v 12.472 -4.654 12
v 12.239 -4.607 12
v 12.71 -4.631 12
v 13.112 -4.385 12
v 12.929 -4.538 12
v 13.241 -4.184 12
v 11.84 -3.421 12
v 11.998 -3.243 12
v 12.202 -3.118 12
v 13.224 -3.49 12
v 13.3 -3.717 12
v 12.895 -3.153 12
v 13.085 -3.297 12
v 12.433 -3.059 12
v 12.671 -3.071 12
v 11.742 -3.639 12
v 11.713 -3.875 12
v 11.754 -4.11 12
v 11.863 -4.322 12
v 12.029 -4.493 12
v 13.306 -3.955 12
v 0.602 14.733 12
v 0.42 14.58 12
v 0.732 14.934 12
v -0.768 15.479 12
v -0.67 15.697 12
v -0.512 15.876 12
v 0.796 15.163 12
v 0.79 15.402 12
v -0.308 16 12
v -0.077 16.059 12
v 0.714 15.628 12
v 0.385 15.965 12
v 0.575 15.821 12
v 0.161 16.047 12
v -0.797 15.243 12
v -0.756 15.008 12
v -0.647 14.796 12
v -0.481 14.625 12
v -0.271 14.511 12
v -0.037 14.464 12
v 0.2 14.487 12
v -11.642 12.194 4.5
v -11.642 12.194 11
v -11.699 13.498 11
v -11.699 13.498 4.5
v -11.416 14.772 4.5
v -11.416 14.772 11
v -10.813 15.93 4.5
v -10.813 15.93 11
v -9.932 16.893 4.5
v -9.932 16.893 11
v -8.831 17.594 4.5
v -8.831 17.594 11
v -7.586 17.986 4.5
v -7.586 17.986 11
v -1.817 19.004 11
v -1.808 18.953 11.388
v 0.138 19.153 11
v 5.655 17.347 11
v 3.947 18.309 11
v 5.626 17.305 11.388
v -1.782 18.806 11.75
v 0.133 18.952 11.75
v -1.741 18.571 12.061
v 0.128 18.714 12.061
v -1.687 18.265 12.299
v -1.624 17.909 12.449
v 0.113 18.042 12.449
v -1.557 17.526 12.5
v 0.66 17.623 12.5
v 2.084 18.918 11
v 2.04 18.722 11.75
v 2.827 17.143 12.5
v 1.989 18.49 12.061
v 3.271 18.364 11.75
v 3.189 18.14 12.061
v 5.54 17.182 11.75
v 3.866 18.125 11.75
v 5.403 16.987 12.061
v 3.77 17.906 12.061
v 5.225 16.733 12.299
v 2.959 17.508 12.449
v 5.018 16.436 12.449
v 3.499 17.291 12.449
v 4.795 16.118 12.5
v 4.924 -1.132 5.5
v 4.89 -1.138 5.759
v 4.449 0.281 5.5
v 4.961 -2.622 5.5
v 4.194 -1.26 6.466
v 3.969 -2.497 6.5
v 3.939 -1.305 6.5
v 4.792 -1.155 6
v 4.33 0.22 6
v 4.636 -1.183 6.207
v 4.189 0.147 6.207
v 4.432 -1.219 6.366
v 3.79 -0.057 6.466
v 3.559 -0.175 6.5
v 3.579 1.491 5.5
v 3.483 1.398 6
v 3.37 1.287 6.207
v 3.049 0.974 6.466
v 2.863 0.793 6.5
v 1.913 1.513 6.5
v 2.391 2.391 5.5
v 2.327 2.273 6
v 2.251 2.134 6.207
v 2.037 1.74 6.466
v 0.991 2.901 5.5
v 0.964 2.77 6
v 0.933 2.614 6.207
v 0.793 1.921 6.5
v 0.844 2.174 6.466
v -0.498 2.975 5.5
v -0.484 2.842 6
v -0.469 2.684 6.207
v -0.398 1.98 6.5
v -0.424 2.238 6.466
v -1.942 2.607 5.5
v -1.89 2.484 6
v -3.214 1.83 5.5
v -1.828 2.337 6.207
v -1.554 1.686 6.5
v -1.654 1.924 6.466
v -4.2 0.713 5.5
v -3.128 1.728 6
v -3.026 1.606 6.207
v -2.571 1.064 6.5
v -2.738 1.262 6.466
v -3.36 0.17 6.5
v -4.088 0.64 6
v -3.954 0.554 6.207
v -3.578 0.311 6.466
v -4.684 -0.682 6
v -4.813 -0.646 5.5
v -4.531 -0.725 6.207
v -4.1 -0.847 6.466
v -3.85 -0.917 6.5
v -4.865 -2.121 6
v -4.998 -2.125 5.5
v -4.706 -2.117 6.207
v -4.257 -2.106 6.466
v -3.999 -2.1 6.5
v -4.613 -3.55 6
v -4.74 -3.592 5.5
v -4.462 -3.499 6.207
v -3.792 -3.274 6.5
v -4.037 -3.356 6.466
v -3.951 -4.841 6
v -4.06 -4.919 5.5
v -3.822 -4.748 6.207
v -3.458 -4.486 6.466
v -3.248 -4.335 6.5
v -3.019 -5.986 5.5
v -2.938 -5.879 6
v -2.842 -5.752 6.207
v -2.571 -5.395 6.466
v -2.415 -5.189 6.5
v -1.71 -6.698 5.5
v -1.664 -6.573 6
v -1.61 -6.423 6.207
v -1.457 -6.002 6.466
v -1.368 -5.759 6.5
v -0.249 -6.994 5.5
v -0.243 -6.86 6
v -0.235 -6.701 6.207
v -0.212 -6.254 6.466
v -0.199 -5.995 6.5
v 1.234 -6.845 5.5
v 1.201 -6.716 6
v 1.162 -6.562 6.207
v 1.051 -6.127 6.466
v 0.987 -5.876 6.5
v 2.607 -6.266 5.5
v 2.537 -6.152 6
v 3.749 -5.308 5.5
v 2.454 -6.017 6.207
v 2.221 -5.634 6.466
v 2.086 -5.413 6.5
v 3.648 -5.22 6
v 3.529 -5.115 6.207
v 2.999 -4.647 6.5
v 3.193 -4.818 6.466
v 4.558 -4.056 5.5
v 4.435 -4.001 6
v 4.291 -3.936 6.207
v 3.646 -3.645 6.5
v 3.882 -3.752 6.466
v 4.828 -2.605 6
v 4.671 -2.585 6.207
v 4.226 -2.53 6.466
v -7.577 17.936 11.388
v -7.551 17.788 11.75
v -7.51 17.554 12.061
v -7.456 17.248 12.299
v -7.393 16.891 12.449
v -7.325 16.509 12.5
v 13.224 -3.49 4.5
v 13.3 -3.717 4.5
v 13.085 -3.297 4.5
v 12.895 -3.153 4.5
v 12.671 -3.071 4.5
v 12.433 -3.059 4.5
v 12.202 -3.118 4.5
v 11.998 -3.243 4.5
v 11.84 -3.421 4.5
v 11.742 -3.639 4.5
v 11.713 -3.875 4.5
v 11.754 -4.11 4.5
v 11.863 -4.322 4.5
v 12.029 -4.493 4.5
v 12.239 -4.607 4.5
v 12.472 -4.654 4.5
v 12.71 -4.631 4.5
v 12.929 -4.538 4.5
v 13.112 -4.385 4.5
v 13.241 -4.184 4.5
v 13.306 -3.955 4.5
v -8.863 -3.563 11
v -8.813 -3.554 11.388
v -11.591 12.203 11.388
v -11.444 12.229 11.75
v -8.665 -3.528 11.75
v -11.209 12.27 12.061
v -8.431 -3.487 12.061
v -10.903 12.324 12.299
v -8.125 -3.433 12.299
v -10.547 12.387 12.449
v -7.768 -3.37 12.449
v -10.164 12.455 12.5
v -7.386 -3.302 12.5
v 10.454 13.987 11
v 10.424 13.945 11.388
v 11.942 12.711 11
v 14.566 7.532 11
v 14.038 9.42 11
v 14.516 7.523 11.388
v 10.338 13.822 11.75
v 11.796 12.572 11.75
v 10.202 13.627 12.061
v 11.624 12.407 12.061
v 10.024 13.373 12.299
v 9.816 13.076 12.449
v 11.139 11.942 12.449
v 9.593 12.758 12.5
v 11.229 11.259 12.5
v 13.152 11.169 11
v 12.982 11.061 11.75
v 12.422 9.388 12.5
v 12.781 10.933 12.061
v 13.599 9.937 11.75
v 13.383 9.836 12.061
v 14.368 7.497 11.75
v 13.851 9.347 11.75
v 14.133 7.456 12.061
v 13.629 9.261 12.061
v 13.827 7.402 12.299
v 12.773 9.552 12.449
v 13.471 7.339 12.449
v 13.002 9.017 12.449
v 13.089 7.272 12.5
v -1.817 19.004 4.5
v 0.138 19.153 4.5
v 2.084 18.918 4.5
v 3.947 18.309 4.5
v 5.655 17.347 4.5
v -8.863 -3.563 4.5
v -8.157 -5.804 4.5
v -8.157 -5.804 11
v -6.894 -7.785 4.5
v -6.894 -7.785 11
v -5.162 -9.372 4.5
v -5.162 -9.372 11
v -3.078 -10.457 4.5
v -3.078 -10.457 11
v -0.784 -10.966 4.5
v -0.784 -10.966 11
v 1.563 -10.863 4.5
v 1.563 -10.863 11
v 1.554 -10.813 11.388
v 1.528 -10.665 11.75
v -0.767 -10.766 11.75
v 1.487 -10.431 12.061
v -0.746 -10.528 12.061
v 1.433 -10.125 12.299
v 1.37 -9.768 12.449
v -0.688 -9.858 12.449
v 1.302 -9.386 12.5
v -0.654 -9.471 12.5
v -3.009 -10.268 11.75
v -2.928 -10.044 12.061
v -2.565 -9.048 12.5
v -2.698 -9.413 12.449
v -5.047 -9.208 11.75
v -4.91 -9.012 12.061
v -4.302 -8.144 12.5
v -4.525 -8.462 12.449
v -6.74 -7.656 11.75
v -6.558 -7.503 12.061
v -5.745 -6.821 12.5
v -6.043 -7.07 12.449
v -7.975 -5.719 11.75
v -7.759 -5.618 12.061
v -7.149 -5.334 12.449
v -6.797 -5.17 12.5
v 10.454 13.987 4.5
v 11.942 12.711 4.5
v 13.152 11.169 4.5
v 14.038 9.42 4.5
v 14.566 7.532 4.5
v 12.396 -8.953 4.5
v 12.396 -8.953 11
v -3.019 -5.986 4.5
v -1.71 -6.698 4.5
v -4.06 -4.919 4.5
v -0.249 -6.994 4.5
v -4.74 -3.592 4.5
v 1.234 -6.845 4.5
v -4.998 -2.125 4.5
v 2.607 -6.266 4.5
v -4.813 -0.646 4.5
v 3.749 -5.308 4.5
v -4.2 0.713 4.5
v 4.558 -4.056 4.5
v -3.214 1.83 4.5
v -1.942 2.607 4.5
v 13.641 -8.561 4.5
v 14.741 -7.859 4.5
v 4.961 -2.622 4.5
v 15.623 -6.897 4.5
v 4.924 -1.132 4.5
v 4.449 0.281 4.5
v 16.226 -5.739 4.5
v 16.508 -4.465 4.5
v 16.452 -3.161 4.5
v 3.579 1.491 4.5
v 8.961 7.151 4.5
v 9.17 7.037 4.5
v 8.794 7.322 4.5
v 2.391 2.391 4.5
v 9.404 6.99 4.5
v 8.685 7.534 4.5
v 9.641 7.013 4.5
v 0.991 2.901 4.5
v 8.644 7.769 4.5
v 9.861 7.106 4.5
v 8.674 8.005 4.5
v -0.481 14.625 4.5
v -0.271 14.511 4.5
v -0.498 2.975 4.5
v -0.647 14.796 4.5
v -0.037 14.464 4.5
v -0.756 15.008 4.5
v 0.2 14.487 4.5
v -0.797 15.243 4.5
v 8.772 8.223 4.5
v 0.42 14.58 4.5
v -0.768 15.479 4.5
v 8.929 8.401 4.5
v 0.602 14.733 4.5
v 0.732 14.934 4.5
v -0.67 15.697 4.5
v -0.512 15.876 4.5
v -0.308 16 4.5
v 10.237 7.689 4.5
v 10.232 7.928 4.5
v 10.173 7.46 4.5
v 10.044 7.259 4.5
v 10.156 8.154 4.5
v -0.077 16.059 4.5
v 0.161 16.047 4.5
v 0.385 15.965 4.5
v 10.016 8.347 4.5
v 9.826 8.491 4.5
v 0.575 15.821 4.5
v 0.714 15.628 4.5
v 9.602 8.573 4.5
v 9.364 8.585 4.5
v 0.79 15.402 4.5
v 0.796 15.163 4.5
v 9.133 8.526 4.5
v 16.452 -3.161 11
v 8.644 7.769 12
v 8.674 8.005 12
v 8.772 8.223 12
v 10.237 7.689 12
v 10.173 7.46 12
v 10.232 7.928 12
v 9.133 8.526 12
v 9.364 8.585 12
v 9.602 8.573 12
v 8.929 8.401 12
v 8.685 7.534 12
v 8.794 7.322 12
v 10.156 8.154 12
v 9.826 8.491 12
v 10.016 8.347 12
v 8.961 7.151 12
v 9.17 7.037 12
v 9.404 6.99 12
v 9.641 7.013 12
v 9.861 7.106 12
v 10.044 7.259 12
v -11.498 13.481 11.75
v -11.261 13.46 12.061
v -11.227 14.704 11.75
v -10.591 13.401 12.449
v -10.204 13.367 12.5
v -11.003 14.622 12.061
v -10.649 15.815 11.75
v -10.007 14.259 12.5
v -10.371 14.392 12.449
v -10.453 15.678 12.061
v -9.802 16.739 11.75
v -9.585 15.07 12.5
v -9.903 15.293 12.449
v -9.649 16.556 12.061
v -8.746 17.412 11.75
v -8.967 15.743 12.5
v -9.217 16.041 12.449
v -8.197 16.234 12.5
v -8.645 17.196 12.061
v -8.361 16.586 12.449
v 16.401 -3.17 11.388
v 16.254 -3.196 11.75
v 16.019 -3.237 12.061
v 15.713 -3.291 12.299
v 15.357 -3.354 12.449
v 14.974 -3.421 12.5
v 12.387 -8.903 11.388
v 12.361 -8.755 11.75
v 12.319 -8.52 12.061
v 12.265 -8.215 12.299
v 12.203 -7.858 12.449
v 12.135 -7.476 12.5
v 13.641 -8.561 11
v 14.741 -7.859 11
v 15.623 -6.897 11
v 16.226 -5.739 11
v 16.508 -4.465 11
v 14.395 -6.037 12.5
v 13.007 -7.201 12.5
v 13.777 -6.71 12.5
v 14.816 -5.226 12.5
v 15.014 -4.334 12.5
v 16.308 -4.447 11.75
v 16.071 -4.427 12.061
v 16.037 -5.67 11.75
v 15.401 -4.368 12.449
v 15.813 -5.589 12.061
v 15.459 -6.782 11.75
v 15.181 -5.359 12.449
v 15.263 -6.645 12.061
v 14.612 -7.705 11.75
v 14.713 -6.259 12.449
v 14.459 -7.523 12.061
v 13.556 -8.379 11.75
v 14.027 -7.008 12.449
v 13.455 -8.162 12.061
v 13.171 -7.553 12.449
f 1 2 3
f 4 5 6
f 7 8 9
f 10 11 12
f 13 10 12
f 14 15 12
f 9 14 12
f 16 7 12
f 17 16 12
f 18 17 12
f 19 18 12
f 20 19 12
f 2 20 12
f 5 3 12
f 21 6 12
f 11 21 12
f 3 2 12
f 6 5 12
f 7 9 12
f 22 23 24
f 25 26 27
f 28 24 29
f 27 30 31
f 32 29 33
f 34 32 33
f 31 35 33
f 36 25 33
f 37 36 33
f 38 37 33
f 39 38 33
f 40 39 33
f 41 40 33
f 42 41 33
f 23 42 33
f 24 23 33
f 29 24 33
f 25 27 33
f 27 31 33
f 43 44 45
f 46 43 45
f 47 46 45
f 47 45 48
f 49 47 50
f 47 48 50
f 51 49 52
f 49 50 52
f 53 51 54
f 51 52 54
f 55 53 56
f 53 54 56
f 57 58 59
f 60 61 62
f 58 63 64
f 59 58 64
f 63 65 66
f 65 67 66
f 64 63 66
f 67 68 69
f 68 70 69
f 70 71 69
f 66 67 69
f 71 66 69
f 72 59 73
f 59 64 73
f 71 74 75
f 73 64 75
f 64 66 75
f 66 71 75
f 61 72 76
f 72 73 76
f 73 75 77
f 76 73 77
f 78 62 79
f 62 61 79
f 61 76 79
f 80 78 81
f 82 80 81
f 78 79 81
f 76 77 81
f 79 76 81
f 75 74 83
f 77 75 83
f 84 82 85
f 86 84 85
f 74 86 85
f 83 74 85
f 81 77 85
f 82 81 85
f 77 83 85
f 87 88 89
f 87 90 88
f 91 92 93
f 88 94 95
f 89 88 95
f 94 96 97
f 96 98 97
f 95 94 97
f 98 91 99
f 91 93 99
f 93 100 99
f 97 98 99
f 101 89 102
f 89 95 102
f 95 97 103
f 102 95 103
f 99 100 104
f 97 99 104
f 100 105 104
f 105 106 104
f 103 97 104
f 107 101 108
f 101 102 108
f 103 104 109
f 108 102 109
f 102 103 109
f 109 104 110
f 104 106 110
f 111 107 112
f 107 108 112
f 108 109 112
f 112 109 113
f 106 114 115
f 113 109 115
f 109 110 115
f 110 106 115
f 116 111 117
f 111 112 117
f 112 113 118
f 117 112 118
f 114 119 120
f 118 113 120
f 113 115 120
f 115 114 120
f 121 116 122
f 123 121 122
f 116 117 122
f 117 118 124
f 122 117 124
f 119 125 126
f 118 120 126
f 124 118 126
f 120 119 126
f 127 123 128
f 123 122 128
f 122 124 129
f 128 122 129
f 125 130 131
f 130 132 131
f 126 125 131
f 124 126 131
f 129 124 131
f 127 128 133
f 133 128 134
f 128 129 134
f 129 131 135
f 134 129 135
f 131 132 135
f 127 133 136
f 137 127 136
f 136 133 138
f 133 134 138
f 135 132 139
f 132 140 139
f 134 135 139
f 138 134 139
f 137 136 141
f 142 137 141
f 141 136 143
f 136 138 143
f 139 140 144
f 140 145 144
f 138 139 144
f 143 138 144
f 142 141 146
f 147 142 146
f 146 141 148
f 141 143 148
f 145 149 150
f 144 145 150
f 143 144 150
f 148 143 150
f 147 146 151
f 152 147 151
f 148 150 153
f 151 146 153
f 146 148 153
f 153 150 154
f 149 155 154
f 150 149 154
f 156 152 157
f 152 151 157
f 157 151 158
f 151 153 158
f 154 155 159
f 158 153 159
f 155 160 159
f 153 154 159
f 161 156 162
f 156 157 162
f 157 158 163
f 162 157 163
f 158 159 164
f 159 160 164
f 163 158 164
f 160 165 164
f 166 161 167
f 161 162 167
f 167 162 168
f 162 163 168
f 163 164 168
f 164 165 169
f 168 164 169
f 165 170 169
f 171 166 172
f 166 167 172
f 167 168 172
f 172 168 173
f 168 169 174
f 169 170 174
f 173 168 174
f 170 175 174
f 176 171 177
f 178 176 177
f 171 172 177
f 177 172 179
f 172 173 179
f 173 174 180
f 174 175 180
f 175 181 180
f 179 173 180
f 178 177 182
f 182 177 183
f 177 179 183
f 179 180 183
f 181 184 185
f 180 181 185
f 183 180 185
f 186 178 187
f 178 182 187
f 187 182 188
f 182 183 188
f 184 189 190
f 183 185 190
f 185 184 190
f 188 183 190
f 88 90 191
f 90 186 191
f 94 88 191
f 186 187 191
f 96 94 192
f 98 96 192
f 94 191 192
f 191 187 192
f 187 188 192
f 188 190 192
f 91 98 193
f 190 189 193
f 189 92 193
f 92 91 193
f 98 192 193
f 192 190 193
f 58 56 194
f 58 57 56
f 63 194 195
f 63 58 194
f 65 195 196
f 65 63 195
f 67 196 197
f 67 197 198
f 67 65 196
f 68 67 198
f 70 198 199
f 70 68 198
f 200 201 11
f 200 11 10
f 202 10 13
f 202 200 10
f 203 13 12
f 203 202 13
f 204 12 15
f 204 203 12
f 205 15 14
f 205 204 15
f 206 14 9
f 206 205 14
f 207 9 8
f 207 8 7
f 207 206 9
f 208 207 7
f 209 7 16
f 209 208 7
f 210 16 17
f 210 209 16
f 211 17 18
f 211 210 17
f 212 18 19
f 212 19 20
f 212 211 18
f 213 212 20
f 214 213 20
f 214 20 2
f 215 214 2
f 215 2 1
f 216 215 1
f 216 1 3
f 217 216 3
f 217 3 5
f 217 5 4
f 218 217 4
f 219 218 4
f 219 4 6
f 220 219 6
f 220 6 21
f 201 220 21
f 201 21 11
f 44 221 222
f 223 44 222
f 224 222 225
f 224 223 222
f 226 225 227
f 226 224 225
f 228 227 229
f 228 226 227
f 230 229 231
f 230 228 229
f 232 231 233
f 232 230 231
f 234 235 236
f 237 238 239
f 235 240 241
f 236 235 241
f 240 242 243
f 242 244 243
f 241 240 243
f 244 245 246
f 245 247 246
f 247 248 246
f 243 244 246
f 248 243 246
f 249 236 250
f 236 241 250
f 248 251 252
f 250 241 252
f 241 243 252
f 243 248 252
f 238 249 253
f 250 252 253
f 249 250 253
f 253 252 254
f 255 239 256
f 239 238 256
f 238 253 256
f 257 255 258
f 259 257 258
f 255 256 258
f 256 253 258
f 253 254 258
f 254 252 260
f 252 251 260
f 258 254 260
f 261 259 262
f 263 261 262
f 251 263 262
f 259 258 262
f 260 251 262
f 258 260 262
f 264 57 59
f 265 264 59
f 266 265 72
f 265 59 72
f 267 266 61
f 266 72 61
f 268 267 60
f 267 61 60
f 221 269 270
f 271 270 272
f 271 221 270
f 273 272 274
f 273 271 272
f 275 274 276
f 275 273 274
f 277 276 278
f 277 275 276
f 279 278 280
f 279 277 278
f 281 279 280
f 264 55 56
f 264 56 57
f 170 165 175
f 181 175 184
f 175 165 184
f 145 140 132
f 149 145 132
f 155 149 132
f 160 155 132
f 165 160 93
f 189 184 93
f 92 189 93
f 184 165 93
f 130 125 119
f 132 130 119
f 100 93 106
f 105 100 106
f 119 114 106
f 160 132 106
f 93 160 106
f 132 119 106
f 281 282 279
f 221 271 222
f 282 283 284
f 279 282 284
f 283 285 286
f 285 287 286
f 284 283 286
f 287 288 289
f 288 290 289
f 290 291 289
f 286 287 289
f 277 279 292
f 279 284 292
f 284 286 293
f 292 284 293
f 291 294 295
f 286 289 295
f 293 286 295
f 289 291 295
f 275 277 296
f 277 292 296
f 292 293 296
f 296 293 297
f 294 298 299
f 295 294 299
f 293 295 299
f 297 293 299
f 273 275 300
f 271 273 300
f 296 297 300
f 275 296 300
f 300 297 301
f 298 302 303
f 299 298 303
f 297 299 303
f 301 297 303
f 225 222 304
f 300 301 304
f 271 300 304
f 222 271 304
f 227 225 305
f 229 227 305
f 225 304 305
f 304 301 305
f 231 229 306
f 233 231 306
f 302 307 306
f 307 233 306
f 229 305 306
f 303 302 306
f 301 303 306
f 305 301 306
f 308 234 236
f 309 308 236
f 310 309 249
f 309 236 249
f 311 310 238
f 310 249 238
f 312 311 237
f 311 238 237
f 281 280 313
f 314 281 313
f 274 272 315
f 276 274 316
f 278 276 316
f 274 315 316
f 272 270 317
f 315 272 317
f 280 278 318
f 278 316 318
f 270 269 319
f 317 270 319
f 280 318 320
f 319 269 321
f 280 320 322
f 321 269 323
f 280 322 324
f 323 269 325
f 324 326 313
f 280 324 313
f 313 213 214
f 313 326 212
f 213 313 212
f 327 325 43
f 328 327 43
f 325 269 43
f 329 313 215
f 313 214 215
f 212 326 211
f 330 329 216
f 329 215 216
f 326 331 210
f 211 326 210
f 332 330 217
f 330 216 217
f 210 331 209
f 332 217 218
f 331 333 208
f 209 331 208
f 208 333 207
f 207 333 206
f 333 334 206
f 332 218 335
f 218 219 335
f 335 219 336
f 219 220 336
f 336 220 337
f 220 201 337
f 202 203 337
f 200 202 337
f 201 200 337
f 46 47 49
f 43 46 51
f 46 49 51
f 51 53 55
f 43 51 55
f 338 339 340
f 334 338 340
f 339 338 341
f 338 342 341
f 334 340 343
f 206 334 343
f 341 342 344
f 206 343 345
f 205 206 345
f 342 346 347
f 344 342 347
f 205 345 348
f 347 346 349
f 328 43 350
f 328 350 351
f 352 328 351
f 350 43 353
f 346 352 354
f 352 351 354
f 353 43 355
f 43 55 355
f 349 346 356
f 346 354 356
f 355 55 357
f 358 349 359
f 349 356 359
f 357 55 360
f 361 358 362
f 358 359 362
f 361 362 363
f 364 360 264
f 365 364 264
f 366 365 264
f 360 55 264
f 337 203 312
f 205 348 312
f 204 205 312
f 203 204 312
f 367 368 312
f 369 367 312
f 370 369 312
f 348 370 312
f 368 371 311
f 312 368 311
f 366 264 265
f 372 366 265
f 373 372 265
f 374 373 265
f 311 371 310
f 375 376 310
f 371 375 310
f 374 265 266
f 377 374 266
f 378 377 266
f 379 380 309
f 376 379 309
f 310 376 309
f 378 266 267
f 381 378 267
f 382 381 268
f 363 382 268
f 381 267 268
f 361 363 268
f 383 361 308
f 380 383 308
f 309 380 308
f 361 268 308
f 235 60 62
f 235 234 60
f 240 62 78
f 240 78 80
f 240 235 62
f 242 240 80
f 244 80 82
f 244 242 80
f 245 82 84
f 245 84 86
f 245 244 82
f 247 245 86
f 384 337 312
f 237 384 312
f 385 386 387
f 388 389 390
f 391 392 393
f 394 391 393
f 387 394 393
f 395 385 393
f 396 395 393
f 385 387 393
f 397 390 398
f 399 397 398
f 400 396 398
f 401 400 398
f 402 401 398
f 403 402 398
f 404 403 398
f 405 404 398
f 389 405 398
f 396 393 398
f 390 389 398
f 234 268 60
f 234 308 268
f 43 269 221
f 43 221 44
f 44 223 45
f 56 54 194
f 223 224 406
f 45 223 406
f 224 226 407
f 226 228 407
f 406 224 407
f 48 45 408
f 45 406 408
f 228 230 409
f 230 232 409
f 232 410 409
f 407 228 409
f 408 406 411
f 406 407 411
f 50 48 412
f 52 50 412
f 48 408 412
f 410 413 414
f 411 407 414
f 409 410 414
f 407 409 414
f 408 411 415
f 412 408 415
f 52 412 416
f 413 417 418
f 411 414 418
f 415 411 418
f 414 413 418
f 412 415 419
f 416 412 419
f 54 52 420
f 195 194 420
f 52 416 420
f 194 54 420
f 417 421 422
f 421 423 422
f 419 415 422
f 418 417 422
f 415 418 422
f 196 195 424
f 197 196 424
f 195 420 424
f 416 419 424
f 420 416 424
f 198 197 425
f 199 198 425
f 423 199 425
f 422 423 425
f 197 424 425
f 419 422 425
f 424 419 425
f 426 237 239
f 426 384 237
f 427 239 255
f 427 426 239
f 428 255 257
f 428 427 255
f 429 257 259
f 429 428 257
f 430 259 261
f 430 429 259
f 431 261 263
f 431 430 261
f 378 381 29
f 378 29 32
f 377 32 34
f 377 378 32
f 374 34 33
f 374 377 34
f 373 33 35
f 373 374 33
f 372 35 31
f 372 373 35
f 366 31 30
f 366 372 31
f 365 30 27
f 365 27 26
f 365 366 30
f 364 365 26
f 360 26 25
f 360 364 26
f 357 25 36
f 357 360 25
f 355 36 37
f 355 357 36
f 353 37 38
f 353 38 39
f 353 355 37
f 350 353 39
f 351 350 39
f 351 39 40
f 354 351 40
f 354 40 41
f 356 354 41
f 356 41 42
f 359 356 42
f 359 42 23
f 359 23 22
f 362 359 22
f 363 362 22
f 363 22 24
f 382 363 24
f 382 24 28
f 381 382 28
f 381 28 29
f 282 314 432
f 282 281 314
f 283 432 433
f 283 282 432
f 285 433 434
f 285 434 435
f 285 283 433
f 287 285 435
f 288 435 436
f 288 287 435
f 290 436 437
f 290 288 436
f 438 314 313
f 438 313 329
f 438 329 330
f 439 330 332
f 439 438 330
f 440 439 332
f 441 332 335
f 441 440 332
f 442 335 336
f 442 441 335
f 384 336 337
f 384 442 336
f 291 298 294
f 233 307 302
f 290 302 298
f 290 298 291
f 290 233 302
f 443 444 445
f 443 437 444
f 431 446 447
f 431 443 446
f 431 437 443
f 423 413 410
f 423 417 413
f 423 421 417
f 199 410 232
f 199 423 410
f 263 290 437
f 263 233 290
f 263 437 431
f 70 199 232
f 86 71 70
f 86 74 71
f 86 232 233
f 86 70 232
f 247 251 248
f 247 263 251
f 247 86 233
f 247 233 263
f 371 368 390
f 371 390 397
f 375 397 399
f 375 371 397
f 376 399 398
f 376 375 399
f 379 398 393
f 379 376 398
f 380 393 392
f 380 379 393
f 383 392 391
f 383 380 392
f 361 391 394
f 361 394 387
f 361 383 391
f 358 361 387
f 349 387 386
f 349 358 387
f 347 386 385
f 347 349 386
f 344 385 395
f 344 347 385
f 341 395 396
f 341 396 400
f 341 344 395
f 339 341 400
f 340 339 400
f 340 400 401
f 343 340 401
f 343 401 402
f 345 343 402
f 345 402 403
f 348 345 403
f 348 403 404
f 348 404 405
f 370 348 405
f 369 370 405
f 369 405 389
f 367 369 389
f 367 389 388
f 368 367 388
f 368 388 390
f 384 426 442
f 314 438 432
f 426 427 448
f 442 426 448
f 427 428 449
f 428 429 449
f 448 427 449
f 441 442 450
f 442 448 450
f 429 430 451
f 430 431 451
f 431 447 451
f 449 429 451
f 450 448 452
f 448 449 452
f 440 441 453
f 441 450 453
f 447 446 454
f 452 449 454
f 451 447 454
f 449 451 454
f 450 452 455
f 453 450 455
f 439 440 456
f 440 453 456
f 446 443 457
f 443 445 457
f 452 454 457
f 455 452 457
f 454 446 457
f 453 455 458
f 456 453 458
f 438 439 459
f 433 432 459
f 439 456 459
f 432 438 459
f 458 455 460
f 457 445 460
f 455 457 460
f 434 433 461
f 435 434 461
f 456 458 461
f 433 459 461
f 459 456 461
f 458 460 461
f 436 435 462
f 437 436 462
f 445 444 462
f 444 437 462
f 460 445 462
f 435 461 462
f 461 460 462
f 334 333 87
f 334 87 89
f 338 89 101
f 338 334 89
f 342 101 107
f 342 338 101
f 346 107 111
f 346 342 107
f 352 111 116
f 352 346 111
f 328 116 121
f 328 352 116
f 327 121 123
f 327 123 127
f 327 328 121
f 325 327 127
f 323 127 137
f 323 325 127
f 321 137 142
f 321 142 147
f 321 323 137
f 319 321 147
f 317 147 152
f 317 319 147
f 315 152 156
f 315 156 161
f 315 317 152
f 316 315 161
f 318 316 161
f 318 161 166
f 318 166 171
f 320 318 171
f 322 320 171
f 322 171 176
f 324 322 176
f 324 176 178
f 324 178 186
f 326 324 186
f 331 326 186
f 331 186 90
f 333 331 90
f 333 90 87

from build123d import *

# Parameters (mm, degrees)
CYLINDER014_R          = 0.8
CYLINDER014_DEPTH      = 12
CYLINDER025_R          = 0.8
CYLINDER025_DEPTH      = 12
CYLINDER015_R          = 0.8
CYLINDER015_DEPTH      = 12
CYLINDER012_R          = 5
CYLINDER012_DEPTH      = 6.5
FILLET022_R            = 1
BOX017_W               = 25
BOX017_H               = 30
BOX017_DEPTH           = 8
FILLET018_R            = 9
FILLET019_R            = 5
CHAMFER001_SIZE        = 10
FILLET020_R            = 10
FILLET021_R            = 1.5
CUT010_PLACEMENT_ANGLE = 10


with BuildPart() as screwholle008:
    # Cylinder014 → Cylinder014 (new body)
    with BuildSketch(Plane(origin=(3, 17, 0), x_dir=(1, 0, 0), z_dir=(0, 0, 1))):
        Circle(CYLINDER014_R)
    extrude(amount=CYLINDER014_DEPTH)


with BuildPart() as screwholle022:
    # Cylinder025 → Cylinder025 (new body)
    with BuildSketch(Plane(origin=(11, 8, 0), x_dir=(1, 0, 0), z_dir=(0, 0, 1))):
        Circle(CYLINDER025_R)
    extrude(amount=CYLINDER025_DEPTH)


with BuildPart() as screwholle009:
    # Cylinder015 → Cylinder015 (new body)
    with BuildSketch(Plane(origin=(12, -4, 0), x_dir=(1, 0, 0), z_dir=(0, 0, 1))):
        Circle(CYLINDER015_R)
    extrude(amount=CYLINDER015_DEPTH)


with BuildPart() as fusion010:
    # Cylinder012 → Cylinder012 (new body)
    with BuildSketch(Plane.XY):
        Circle(CYLINDER012_R)
    extrude(amount=CYLINDER012_DEPTH)

    # Fillet022
    fillet022_edges = [fusion010.edges().sort_by_distance(p)[0] for p in [
        (-5, 0, 6.5),
    ]]
    fillet(fillet022_edges, radius=FILLET022_R)

    # Fusion010: union ScrewHolle008, ScrewHolle022, ScrewHolle009
    add(screwholle008.part)
    add(screwholle022.part)
    add(screwholle009.part)


with BuildPart() as cut010:
    # Box017 → Box017 (new body)
    with BuildSketch(Plane(origin=(-9, -9, 4.5), x_dir=(1, 0, 0), z_dir=(0, 0, 1))):
        with Locations((12.5, 15)):
            Rectangle(BOX017_W, BOX017_H)
    extrude(amount=BOX017_DEPTH)

    # Fillet018
    fillet018_edges = [cut010.edges().sort_by_distance(p)[0] for p in [
        (-9, -9, 8.5),
    ]]
    fillet(fillet018_edges, radius=FILLET018_R)

    # Fillet019
    fillet019_edges = [cut010.edges().sort_by_distance(p)[0] for p in [
        (-9, 21, 8.5),
        (16, -9, 8.5),
    ]]
    fillet(fillet019_edges, radius=FILLET019_R)

    # Chamfer001
    chamfer001_edges = [cut010.edges().sort_by_distance(p)[0] for p in [
        (16, 21, 8.5),
    ]]
    chamfer(chamfer001_edges, length=CHAMFER001_SIZE)

    # Fillet020
    fillet020_edges = [cut010.edges().sort_by_distance(p)[0] for p in [
        (6, 21, 8.5),
        (16, 11, 8.5),
    ]]
    fillet(fillet020_edges, radius=FILLET020_R)

    # Fillet021
    fillet021_edges = [cut010.edges().sort_by_distance(p)[0] for p in [
        (11, 16, 12.5),
    ]]
    fillet(fillet021_edges, radius=FILLET021_R)

    # Cut010: cut Fusion010
    add(fusion010.part, mode=Mode.SUBTRACT)


with BuildPart() as cut010_1:
    # Cut010 placement: moved
    add(cut010.part.moved(Location((0, -2, 0))).rotate(Axis((0, -2, 0), (0, 0, 1)), CUT010_PLACEMENT_ANGLE))


solid = cut010_1.part
